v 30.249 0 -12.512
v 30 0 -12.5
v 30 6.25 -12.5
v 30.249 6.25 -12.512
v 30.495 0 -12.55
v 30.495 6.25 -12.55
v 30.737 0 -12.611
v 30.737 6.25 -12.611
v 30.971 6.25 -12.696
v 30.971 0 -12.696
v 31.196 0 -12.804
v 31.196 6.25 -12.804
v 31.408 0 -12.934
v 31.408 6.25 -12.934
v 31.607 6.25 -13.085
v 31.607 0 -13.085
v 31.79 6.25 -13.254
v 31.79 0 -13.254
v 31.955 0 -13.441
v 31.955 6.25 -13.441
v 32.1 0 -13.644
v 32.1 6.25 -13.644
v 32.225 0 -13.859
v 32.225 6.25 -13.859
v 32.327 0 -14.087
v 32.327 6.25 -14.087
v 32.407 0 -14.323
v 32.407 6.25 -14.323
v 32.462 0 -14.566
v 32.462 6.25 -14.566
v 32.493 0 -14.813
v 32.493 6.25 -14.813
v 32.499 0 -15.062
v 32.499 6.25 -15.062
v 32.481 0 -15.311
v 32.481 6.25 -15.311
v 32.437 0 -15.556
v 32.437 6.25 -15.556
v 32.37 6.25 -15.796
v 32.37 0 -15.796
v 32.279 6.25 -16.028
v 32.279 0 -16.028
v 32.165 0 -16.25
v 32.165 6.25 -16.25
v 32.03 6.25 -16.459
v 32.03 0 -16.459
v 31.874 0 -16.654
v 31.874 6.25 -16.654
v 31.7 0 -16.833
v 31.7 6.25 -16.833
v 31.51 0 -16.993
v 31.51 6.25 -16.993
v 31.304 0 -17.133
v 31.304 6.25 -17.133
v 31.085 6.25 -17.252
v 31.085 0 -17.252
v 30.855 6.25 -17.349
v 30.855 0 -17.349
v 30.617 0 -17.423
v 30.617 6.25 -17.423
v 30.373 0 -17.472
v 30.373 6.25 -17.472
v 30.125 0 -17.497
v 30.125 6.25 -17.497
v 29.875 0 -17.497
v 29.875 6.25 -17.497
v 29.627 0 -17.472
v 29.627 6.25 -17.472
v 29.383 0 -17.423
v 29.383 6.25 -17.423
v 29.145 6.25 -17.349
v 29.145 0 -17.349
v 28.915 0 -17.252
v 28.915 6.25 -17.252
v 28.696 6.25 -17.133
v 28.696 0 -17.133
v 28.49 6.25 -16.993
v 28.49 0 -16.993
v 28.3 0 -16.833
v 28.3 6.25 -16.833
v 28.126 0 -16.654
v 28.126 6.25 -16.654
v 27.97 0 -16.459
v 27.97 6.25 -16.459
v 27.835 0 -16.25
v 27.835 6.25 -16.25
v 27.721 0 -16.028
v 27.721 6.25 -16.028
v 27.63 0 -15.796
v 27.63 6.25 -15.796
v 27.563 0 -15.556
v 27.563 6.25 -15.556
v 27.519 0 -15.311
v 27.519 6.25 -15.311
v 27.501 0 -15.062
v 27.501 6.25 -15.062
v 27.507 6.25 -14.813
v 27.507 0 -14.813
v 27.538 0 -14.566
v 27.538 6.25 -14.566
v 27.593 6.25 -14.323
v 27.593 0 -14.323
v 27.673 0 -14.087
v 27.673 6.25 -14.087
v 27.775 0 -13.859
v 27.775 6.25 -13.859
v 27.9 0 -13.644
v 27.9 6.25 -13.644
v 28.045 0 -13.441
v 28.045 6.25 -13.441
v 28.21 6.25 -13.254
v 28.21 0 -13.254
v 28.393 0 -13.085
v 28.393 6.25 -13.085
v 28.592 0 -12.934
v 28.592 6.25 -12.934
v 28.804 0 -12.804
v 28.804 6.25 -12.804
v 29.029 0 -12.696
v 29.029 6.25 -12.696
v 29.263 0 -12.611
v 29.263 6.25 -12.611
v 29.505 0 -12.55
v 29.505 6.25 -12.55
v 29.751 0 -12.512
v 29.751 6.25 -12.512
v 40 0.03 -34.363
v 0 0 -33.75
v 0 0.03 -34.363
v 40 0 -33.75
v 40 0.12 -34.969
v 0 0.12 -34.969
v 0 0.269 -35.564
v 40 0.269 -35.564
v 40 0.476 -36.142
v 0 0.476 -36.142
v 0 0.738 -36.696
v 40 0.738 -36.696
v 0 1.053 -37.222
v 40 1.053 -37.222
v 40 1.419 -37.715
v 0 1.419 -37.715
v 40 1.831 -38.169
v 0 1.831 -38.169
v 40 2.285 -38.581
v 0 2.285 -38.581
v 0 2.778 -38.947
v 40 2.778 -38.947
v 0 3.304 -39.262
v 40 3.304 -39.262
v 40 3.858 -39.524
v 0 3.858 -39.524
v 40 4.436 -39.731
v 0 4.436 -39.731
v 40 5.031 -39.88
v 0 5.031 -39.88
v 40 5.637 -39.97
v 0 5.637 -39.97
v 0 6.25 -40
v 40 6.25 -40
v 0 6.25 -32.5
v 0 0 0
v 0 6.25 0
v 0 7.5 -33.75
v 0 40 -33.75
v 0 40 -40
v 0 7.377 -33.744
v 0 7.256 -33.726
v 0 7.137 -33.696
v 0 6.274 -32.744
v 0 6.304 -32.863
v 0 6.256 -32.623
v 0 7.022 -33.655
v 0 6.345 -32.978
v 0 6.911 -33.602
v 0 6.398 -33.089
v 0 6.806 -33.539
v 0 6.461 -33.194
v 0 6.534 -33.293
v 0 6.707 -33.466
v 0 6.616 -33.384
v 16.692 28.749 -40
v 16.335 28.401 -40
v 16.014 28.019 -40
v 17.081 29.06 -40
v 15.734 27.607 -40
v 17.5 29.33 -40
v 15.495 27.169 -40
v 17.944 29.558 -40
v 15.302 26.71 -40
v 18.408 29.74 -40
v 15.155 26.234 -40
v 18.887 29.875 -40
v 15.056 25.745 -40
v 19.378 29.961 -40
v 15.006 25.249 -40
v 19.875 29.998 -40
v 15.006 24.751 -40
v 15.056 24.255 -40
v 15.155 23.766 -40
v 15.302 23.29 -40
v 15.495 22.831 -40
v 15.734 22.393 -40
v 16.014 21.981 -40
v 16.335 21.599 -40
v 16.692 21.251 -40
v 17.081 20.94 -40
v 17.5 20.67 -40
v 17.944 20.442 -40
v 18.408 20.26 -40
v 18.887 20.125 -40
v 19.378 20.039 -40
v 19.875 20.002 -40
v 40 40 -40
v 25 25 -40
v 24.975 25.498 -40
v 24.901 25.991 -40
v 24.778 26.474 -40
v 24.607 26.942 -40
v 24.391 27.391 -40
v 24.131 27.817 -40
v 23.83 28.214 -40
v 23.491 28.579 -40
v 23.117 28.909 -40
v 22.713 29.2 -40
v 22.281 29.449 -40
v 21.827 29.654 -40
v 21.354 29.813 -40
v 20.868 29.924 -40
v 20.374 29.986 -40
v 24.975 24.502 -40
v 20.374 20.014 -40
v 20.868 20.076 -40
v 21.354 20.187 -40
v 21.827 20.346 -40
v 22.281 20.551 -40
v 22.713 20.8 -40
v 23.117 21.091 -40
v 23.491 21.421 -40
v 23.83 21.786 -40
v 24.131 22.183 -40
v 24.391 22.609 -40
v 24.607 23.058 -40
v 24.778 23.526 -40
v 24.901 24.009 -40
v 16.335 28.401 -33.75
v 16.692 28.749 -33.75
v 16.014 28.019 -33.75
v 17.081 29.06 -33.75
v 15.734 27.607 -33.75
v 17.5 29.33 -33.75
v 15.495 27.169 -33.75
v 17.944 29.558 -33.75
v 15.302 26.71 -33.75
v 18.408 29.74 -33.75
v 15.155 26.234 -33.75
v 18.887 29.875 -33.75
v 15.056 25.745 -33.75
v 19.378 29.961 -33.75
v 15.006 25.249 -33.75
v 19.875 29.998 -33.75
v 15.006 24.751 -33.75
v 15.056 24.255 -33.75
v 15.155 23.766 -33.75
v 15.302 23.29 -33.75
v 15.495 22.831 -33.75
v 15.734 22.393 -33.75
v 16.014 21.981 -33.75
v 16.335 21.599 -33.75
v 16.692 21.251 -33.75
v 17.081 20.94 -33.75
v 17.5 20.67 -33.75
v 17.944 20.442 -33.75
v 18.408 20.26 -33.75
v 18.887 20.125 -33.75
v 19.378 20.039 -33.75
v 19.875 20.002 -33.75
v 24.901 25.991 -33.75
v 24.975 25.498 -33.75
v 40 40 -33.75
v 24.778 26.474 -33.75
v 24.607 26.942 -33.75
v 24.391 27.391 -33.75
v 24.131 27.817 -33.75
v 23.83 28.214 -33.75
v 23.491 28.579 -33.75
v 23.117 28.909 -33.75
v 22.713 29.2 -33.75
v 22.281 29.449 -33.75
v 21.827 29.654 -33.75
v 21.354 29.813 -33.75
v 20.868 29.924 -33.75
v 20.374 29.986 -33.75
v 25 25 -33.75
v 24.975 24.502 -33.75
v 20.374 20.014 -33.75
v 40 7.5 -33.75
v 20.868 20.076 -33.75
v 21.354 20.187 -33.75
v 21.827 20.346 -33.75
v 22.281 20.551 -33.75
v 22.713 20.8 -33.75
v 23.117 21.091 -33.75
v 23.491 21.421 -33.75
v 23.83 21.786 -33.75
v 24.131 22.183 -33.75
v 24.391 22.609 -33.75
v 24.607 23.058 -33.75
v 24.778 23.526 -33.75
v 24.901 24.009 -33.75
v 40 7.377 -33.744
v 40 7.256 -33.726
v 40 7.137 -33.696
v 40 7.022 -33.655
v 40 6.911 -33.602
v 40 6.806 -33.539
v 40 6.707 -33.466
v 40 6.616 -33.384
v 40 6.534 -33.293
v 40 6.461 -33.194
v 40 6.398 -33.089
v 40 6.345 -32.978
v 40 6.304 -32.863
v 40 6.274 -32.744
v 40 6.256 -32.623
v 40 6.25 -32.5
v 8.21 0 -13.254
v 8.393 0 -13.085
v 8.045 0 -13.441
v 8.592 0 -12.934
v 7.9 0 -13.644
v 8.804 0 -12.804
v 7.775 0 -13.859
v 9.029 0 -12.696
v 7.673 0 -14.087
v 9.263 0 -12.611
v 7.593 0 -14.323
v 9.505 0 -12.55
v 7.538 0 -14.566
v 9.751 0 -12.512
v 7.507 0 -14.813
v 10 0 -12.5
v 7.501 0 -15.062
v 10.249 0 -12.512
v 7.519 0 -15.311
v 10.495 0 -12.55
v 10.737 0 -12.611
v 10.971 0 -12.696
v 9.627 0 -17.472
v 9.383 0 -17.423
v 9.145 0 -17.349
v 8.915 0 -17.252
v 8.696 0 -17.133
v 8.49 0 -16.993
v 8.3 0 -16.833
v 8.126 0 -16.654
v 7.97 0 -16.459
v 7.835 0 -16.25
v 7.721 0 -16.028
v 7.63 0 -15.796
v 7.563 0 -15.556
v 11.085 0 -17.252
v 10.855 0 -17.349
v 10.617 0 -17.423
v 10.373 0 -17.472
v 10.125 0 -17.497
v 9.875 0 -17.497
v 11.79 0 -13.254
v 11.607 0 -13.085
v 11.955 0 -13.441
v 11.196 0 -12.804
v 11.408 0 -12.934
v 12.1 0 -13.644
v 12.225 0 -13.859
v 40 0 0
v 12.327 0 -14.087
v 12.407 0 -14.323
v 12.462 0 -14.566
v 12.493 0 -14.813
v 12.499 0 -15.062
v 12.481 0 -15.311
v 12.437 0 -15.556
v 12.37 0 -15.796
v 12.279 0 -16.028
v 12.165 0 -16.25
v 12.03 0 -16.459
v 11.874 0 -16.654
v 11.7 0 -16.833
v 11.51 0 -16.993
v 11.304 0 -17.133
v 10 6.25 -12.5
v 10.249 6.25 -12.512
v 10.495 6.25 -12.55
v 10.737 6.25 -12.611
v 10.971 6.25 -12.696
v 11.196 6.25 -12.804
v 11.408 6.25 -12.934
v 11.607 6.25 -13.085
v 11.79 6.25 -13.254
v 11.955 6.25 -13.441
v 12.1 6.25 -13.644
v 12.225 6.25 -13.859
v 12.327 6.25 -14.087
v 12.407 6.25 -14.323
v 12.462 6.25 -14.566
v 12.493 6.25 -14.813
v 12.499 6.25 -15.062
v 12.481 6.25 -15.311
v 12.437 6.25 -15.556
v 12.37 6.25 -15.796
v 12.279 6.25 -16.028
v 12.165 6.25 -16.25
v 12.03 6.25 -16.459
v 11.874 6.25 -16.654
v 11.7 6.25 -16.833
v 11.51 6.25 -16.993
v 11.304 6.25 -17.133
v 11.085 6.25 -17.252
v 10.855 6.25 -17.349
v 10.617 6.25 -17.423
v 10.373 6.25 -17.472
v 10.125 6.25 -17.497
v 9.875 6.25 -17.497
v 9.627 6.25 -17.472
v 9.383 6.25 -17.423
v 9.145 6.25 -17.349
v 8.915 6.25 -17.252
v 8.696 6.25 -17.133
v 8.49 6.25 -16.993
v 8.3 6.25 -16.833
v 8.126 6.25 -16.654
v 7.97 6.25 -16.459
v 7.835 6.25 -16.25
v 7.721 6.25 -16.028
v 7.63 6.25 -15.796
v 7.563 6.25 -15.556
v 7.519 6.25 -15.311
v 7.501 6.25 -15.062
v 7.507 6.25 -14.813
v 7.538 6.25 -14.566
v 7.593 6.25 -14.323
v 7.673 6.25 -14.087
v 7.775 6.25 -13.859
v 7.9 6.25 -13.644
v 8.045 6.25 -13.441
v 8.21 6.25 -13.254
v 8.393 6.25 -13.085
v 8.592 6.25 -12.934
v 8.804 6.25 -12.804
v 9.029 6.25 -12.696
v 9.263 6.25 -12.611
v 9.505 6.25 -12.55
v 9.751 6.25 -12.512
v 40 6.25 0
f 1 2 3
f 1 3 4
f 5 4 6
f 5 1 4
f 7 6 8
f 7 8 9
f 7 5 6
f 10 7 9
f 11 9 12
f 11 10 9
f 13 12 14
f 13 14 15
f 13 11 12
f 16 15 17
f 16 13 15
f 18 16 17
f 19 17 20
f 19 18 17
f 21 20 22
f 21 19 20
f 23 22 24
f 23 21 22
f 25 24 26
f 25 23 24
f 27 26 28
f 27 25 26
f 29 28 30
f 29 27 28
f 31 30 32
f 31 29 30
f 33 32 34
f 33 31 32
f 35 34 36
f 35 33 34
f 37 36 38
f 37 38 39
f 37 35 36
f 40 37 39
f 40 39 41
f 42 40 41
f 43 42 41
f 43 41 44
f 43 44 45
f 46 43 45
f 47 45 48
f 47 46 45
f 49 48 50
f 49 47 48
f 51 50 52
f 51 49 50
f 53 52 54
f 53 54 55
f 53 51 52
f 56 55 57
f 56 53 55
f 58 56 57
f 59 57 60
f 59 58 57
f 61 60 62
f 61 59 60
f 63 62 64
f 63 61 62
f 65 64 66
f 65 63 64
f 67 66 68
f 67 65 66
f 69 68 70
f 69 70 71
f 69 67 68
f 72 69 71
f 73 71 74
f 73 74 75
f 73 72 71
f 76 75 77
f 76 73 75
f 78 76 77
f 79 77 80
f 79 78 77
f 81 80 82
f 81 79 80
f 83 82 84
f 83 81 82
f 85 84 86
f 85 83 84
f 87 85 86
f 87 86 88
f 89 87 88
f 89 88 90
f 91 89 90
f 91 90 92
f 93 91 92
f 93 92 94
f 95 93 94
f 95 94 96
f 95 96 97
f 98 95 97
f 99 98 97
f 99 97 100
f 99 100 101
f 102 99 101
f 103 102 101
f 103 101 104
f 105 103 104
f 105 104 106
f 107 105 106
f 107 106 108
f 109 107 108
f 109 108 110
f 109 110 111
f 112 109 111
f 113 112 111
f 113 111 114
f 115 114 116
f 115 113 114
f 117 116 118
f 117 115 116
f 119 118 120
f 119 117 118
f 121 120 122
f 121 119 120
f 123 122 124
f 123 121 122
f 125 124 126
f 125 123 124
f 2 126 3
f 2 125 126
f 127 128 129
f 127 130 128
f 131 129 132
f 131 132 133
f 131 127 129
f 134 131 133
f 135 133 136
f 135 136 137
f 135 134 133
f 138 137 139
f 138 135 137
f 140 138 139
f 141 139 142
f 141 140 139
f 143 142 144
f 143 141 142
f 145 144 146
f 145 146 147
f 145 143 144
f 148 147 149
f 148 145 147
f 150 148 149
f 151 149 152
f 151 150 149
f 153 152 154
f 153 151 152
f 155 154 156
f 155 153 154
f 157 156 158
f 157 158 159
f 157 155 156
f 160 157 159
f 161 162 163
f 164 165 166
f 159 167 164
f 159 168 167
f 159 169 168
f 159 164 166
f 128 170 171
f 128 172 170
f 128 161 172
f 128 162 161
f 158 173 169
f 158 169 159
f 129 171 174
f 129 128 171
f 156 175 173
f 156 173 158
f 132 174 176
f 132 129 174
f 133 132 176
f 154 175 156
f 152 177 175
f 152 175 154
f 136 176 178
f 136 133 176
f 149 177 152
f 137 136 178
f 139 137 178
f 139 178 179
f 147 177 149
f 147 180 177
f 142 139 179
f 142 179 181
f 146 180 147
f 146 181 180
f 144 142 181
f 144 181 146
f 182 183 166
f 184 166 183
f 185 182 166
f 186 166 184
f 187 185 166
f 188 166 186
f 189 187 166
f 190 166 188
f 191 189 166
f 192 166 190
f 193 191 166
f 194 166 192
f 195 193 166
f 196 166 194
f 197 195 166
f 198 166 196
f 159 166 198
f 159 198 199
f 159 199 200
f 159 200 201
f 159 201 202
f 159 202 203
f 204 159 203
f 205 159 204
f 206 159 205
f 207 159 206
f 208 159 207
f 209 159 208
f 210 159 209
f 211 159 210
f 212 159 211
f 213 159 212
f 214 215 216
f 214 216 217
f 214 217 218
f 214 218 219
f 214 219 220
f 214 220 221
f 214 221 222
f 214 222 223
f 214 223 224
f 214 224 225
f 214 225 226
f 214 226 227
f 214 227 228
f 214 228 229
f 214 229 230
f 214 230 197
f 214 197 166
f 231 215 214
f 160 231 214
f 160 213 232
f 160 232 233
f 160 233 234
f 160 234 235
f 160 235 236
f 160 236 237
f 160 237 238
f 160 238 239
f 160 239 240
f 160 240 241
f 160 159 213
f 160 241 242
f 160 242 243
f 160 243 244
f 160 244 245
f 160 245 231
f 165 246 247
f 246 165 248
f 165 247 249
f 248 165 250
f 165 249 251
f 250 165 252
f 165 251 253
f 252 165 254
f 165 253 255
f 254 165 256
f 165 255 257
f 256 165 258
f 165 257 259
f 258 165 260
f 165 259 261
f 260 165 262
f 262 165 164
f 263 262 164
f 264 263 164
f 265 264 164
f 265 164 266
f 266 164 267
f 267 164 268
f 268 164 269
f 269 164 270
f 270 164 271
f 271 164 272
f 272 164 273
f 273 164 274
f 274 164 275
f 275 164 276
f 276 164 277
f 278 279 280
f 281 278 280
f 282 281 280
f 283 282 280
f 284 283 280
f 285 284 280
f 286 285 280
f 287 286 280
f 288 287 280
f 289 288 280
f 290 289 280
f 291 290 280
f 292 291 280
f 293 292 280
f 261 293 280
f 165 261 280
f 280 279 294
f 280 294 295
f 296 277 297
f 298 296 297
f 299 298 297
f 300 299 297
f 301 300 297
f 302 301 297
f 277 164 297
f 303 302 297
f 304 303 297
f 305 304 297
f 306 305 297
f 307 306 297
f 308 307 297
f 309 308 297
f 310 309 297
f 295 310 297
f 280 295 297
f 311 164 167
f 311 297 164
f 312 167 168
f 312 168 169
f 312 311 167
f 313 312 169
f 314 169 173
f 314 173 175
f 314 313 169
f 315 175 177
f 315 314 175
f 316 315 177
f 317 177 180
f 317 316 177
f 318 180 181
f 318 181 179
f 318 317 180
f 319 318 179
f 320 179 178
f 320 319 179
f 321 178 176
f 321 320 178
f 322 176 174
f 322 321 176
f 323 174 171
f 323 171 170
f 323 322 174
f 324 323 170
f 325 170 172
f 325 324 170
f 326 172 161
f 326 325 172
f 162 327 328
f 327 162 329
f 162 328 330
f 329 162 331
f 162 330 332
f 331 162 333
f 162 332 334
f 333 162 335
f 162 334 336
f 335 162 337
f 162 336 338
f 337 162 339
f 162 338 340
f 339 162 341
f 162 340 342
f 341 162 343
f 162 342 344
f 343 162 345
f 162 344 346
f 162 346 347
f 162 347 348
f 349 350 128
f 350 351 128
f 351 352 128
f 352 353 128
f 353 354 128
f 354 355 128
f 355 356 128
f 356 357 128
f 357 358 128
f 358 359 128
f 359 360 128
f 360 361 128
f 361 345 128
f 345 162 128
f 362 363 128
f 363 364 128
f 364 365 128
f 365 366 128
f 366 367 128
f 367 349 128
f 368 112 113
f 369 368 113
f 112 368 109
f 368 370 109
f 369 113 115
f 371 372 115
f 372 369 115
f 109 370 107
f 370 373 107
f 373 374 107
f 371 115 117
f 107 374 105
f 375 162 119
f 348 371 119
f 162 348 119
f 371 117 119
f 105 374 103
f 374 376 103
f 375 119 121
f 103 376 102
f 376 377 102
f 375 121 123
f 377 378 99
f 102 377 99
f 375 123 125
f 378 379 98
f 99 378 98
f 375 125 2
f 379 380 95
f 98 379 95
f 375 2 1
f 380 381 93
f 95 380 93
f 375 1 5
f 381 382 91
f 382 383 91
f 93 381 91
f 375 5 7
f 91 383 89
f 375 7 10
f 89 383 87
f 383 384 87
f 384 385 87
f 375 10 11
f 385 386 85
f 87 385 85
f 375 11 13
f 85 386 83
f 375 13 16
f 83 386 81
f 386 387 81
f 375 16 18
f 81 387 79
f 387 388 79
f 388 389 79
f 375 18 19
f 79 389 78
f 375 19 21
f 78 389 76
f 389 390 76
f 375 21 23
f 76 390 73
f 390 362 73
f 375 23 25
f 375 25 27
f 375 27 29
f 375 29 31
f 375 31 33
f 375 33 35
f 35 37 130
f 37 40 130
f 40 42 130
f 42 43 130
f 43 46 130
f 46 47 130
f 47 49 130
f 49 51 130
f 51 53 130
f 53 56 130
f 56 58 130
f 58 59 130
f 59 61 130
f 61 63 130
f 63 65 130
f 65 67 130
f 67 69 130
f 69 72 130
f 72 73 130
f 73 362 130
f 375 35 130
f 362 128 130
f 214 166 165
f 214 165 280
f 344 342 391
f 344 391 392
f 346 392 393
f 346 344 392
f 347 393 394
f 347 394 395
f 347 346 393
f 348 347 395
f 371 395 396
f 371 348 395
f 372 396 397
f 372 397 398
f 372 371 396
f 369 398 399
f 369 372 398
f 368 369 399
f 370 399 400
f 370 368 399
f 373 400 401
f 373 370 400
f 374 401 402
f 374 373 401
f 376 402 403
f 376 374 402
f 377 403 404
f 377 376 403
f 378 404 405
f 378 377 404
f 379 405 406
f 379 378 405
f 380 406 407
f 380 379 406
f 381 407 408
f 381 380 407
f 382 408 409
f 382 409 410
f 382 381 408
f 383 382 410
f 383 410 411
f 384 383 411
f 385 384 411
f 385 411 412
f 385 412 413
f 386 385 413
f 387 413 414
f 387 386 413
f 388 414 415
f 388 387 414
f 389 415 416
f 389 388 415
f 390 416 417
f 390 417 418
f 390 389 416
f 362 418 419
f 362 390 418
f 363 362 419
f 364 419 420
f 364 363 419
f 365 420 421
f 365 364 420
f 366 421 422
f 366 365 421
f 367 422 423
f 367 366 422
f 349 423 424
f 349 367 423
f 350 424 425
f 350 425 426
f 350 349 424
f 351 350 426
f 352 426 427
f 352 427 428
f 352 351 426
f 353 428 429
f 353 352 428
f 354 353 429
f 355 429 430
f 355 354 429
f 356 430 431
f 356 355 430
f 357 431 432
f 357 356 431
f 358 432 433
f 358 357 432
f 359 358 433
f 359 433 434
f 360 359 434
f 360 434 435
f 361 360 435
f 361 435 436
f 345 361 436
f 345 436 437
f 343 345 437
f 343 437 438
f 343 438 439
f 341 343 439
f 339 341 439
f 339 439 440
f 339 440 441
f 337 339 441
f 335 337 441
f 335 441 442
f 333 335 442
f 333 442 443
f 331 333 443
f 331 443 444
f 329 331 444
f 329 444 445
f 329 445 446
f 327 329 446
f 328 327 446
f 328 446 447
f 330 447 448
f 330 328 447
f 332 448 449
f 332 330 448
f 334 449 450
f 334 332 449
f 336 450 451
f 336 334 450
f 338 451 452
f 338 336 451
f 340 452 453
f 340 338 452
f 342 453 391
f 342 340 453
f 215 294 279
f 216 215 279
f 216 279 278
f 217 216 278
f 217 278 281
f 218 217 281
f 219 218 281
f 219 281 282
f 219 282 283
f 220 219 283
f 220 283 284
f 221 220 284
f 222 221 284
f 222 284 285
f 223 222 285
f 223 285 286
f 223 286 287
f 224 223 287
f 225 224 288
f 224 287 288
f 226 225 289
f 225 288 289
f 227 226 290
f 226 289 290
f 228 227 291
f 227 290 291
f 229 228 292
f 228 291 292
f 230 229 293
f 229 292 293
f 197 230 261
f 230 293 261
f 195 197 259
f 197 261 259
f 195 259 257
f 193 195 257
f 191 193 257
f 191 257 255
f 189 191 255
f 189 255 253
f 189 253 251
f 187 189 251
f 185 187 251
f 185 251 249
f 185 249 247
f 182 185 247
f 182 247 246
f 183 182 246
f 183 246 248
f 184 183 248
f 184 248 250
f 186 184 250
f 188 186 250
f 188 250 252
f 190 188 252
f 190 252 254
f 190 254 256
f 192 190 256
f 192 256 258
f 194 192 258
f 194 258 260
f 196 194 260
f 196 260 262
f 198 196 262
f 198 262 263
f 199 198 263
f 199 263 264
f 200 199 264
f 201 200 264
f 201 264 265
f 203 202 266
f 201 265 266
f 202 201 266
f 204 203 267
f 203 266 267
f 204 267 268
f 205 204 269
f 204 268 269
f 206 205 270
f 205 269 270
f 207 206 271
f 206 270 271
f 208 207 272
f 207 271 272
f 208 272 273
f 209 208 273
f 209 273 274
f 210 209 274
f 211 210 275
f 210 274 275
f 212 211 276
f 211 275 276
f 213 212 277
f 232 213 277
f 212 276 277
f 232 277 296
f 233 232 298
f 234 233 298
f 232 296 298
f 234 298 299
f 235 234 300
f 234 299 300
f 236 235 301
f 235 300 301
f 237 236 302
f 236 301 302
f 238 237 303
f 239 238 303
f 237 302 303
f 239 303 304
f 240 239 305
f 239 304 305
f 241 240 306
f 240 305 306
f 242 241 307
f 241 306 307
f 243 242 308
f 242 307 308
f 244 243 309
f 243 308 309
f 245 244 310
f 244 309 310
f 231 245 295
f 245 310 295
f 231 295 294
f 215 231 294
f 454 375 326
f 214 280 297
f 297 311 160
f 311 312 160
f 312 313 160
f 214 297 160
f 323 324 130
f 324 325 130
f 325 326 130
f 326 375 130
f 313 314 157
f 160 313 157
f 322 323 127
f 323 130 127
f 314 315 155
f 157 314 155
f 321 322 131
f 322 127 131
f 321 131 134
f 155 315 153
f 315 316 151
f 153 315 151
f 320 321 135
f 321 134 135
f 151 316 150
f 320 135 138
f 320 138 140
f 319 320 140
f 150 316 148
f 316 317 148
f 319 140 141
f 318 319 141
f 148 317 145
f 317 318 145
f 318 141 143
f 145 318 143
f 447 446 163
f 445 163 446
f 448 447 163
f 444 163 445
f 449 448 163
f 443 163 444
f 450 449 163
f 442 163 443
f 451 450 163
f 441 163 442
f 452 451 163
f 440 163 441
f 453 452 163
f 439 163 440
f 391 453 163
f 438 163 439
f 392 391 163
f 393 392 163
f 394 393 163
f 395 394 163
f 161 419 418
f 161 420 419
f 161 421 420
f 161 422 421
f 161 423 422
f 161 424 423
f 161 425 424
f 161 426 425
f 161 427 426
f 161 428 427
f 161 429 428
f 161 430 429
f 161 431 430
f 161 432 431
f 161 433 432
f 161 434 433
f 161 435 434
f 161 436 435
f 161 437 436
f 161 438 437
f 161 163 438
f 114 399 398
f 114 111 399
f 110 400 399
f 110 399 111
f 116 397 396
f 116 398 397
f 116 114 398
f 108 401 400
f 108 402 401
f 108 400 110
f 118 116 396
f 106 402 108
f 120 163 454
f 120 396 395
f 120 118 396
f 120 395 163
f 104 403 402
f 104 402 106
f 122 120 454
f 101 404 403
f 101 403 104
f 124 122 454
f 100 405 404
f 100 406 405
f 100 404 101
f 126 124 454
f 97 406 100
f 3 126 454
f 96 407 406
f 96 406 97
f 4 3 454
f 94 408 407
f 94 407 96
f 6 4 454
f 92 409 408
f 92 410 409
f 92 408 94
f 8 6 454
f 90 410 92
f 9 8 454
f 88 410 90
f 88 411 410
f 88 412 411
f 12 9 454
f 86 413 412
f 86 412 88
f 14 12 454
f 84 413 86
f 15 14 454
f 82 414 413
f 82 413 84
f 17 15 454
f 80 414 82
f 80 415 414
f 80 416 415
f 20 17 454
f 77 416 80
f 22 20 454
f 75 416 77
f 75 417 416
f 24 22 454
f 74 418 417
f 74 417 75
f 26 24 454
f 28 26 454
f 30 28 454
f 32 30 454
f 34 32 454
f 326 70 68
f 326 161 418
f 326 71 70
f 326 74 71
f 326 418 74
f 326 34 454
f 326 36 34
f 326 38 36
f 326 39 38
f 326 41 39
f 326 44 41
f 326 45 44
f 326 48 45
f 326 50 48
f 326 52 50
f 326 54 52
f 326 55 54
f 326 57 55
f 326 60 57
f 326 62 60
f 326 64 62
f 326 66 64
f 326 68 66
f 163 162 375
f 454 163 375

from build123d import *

# Parameters (mm, degrees)
SKETCH1_W           = 40
SKETCH1_H           = 33.75
SKETCH1_R           = 2.5
BOSS_EXTRUDE1_DEPTH = 6.25
SKETCH1_3_W         = 40
SKETCH1_3_H         = 6.25
BOSS_EXTRUDE2_DEPTH = 40
FILLET1_R           = 6.25
FILLET2_R           = 1.25
SKETCH2_R           = 5
CUT_EXTRUDE1_DEPTH  = 40


with BuildPart() as part:
    # Sketch1 → Boss-Extrude1 (new body)
    with BuildSketch(Plane(origin=(0, 0, 0), x_dir=(1, 0, 0), z_dir=(0, 1, 0))):
        with Locations((20, 16.875)):
            Rectangle(SKETCH1_W, SKETCH1_H)
        with Locations((10, 15)):
            Circle(SKETCH1_R, mode=Mode.SUBTRACT)
        with Locations((30, 15)):
            Circle(SKETCH1_R, mode=Mode.SUBTRACT)
    extrude(amount=BOSS_EXTRUDE1_DEPTH)

    # Sketch1<3> → Boss-Extrude2 (add)
    with BuildSketch(Plane(origin=(0, 0, 0), x_dir=(1, 0, 0), z_dir=(0, 1, 0))):
        with Locations((20, 36.875)):
            Rectangle(SKETCH1_3_W, SKETCH1_3_H)
    extrude(amount=BOSS_EXTRUDE2_DEPTH)

    # Fillet1
    fillet1_edges = [part.edges().sort_by_distance(p)[0] for p in [
        (20, 0, -40),
    ]]
    fillet(fillet1_edges, radius=FILLET1_R)

    # Fillet2
    fillet2_edges = [part.edges().sort_by_distance(p)[0] for p in [
        (20, 6.25, -33.75),
    ]]
    fillet(fillet2_edges, radius=FILLET2_R)

    # Sketch2 → Cut-Extrude1 (cut)
    with BuildSketch(Plane.XY.offset(-33.75)):
        with Locations((20, 25)):
            Circle(SKETCH2_R)
    extrude(amount=-CUT_EXTRUDE1_DEPTH, mode=Mode.SUBTRACT)


solid = part.part
